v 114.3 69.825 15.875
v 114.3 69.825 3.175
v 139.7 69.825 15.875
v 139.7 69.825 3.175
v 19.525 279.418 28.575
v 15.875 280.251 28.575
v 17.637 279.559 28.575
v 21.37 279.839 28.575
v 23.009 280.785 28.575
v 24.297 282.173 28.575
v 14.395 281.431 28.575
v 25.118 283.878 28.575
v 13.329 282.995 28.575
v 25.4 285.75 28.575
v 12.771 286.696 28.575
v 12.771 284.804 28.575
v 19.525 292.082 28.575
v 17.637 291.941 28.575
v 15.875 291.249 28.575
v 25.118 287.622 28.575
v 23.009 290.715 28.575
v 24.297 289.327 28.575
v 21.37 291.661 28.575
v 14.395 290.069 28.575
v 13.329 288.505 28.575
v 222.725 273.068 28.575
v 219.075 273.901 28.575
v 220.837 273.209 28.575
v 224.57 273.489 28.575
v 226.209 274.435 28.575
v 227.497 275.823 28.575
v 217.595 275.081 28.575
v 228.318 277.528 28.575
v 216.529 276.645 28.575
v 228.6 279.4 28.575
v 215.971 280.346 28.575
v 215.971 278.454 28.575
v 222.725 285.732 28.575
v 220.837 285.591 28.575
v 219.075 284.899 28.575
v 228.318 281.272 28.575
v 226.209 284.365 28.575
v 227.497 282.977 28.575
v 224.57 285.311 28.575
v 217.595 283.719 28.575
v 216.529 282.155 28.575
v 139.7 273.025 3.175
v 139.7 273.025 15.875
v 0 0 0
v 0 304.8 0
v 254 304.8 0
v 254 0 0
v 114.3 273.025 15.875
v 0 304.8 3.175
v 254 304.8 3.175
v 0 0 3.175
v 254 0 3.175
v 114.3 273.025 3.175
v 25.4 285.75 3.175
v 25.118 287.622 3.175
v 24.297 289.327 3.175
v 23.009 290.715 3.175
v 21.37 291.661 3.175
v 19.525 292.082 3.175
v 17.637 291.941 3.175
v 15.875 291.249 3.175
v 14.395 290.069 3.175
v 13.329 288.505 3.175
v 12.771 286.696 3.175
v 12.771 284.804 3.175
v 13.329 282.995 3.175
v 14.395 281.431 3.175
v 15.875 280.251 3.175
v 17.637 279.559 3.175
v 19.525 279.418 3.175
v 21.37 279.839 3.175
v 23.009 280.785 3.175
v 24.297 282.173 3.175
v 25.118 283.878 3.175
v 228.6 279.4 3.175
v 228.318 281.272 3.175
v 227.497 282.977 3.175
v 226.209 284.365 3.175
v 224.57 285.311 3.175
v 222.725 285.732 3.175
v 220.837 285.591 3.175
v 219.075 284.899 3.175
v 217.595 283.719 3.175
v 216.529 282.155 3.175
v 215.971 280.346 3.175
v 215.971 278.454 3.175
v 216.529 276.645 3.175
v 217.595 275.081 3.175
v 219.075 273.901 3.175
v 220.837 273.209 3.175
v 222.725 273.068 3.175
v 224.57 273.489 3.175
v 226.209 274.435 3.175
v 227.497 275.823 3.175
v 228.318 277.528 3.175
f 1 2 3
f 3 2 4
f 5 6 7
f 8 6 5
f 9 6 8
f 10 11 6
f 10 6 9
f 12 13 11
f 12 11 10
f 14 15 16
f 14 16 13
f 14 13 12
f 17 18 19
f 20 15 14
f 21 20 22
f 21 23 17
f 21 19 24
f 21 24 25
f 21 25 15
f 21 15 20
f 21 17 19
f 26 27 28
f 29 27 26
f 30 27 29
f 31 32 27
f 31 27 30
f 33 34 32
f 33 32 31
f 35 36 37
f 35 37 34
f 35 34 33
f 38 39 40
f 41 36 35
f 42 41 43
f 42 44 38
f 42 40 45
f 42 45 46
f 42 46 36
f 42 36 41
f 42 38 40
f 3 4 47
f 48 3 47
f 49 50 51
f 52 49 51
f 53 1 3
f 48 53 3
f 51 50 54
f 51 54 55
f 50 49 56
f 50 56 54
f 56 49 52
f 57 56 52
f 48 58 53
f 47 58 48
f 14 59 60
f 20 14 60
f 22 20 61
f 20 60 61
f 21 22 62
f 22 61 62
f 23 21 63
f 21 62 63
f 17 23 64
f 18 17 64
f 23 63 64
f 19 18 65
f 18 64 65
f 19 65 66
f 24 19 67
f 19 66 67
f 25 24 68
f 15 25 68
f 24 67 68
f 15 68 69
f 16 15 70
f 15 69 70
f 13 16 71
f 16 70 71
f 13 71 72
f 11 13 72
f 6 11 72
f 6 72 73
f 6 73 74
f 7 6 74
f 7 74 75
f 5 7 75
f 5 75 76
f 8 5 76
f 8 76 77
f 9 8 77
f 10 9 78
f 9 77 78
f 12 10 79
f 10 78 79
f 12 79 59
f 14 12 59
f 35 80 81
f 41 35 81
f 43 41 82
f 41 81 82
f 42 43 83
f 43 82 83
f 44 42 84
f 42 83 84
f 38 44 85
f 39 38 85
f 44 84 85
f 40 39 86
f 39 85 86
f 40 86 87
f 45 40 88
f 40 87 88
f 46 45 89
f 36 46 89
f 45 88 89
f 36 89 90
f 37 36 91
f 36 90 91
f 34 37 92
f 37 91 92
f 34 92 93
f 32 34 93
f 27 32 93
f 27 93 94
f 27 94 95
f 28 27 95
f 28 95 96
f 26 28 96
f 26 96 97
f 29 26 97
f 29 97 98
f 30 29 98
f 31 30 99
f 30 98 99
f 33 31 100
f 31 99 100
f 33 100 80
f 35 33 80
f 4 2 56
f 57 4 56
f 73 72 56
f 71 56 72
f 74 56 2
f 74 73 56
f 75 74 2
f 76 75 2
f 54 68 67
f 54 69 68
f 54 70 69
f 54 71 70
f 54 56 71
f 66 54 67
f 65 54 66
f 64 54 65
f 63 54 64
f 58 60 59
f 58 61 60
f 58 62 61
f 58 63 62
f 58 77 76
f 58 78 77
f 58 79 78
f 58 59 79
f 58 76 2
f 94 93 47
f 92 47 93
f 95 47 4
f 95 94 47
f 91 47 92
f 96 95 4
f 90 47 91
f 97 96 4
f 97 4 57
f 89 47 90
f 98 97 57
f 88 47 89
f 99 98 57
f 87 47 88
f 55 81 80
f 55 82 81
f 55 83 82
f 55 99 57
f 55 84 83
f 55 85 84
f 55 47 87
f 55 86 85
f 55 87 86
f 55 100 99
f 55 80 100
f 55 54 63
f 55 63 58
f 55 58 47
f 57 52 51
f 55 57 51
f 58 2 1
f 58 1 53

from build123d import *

# Parameters (mm, degrees)
F0_W     = 254
F0_H     = 304.8
F1_DEPTH = 3.175
F2_W     = 25.4
F2_H     = 203.2
F3_DEPTH = 12.7
F4_R     = 6.35
F5_DEPTH = 25.4


with BuildPart() as f1:
    # F0 (on Top) → F1 (new body)
    with BuildSketch(Plane.XY):
        with Locations((127, 152.4)):
            Rectangle(F0_W, F0_H)
    extrude(amount=F1_DEPTH)

    # F2 (on face) → F3 (join)
    with BuildSketch(Plane.XY.offset(3.175)):
        with Locations((127, 171.425429)):
            Rectangle(F2_W, F2_H)
    extrude(amount=F3_DEPTH)

    # F4 (on face) → F5 (join)
    with BuildSketch(Plane.XY.offset(3.175)):
        with Locations((222.25, 279.4)):
            Circle(F4_R)
        with Locations((19.05, 285.75)):
            Circle(F4_R)
    extrude(amount=F5_DEPTH)


solid = f1.part
